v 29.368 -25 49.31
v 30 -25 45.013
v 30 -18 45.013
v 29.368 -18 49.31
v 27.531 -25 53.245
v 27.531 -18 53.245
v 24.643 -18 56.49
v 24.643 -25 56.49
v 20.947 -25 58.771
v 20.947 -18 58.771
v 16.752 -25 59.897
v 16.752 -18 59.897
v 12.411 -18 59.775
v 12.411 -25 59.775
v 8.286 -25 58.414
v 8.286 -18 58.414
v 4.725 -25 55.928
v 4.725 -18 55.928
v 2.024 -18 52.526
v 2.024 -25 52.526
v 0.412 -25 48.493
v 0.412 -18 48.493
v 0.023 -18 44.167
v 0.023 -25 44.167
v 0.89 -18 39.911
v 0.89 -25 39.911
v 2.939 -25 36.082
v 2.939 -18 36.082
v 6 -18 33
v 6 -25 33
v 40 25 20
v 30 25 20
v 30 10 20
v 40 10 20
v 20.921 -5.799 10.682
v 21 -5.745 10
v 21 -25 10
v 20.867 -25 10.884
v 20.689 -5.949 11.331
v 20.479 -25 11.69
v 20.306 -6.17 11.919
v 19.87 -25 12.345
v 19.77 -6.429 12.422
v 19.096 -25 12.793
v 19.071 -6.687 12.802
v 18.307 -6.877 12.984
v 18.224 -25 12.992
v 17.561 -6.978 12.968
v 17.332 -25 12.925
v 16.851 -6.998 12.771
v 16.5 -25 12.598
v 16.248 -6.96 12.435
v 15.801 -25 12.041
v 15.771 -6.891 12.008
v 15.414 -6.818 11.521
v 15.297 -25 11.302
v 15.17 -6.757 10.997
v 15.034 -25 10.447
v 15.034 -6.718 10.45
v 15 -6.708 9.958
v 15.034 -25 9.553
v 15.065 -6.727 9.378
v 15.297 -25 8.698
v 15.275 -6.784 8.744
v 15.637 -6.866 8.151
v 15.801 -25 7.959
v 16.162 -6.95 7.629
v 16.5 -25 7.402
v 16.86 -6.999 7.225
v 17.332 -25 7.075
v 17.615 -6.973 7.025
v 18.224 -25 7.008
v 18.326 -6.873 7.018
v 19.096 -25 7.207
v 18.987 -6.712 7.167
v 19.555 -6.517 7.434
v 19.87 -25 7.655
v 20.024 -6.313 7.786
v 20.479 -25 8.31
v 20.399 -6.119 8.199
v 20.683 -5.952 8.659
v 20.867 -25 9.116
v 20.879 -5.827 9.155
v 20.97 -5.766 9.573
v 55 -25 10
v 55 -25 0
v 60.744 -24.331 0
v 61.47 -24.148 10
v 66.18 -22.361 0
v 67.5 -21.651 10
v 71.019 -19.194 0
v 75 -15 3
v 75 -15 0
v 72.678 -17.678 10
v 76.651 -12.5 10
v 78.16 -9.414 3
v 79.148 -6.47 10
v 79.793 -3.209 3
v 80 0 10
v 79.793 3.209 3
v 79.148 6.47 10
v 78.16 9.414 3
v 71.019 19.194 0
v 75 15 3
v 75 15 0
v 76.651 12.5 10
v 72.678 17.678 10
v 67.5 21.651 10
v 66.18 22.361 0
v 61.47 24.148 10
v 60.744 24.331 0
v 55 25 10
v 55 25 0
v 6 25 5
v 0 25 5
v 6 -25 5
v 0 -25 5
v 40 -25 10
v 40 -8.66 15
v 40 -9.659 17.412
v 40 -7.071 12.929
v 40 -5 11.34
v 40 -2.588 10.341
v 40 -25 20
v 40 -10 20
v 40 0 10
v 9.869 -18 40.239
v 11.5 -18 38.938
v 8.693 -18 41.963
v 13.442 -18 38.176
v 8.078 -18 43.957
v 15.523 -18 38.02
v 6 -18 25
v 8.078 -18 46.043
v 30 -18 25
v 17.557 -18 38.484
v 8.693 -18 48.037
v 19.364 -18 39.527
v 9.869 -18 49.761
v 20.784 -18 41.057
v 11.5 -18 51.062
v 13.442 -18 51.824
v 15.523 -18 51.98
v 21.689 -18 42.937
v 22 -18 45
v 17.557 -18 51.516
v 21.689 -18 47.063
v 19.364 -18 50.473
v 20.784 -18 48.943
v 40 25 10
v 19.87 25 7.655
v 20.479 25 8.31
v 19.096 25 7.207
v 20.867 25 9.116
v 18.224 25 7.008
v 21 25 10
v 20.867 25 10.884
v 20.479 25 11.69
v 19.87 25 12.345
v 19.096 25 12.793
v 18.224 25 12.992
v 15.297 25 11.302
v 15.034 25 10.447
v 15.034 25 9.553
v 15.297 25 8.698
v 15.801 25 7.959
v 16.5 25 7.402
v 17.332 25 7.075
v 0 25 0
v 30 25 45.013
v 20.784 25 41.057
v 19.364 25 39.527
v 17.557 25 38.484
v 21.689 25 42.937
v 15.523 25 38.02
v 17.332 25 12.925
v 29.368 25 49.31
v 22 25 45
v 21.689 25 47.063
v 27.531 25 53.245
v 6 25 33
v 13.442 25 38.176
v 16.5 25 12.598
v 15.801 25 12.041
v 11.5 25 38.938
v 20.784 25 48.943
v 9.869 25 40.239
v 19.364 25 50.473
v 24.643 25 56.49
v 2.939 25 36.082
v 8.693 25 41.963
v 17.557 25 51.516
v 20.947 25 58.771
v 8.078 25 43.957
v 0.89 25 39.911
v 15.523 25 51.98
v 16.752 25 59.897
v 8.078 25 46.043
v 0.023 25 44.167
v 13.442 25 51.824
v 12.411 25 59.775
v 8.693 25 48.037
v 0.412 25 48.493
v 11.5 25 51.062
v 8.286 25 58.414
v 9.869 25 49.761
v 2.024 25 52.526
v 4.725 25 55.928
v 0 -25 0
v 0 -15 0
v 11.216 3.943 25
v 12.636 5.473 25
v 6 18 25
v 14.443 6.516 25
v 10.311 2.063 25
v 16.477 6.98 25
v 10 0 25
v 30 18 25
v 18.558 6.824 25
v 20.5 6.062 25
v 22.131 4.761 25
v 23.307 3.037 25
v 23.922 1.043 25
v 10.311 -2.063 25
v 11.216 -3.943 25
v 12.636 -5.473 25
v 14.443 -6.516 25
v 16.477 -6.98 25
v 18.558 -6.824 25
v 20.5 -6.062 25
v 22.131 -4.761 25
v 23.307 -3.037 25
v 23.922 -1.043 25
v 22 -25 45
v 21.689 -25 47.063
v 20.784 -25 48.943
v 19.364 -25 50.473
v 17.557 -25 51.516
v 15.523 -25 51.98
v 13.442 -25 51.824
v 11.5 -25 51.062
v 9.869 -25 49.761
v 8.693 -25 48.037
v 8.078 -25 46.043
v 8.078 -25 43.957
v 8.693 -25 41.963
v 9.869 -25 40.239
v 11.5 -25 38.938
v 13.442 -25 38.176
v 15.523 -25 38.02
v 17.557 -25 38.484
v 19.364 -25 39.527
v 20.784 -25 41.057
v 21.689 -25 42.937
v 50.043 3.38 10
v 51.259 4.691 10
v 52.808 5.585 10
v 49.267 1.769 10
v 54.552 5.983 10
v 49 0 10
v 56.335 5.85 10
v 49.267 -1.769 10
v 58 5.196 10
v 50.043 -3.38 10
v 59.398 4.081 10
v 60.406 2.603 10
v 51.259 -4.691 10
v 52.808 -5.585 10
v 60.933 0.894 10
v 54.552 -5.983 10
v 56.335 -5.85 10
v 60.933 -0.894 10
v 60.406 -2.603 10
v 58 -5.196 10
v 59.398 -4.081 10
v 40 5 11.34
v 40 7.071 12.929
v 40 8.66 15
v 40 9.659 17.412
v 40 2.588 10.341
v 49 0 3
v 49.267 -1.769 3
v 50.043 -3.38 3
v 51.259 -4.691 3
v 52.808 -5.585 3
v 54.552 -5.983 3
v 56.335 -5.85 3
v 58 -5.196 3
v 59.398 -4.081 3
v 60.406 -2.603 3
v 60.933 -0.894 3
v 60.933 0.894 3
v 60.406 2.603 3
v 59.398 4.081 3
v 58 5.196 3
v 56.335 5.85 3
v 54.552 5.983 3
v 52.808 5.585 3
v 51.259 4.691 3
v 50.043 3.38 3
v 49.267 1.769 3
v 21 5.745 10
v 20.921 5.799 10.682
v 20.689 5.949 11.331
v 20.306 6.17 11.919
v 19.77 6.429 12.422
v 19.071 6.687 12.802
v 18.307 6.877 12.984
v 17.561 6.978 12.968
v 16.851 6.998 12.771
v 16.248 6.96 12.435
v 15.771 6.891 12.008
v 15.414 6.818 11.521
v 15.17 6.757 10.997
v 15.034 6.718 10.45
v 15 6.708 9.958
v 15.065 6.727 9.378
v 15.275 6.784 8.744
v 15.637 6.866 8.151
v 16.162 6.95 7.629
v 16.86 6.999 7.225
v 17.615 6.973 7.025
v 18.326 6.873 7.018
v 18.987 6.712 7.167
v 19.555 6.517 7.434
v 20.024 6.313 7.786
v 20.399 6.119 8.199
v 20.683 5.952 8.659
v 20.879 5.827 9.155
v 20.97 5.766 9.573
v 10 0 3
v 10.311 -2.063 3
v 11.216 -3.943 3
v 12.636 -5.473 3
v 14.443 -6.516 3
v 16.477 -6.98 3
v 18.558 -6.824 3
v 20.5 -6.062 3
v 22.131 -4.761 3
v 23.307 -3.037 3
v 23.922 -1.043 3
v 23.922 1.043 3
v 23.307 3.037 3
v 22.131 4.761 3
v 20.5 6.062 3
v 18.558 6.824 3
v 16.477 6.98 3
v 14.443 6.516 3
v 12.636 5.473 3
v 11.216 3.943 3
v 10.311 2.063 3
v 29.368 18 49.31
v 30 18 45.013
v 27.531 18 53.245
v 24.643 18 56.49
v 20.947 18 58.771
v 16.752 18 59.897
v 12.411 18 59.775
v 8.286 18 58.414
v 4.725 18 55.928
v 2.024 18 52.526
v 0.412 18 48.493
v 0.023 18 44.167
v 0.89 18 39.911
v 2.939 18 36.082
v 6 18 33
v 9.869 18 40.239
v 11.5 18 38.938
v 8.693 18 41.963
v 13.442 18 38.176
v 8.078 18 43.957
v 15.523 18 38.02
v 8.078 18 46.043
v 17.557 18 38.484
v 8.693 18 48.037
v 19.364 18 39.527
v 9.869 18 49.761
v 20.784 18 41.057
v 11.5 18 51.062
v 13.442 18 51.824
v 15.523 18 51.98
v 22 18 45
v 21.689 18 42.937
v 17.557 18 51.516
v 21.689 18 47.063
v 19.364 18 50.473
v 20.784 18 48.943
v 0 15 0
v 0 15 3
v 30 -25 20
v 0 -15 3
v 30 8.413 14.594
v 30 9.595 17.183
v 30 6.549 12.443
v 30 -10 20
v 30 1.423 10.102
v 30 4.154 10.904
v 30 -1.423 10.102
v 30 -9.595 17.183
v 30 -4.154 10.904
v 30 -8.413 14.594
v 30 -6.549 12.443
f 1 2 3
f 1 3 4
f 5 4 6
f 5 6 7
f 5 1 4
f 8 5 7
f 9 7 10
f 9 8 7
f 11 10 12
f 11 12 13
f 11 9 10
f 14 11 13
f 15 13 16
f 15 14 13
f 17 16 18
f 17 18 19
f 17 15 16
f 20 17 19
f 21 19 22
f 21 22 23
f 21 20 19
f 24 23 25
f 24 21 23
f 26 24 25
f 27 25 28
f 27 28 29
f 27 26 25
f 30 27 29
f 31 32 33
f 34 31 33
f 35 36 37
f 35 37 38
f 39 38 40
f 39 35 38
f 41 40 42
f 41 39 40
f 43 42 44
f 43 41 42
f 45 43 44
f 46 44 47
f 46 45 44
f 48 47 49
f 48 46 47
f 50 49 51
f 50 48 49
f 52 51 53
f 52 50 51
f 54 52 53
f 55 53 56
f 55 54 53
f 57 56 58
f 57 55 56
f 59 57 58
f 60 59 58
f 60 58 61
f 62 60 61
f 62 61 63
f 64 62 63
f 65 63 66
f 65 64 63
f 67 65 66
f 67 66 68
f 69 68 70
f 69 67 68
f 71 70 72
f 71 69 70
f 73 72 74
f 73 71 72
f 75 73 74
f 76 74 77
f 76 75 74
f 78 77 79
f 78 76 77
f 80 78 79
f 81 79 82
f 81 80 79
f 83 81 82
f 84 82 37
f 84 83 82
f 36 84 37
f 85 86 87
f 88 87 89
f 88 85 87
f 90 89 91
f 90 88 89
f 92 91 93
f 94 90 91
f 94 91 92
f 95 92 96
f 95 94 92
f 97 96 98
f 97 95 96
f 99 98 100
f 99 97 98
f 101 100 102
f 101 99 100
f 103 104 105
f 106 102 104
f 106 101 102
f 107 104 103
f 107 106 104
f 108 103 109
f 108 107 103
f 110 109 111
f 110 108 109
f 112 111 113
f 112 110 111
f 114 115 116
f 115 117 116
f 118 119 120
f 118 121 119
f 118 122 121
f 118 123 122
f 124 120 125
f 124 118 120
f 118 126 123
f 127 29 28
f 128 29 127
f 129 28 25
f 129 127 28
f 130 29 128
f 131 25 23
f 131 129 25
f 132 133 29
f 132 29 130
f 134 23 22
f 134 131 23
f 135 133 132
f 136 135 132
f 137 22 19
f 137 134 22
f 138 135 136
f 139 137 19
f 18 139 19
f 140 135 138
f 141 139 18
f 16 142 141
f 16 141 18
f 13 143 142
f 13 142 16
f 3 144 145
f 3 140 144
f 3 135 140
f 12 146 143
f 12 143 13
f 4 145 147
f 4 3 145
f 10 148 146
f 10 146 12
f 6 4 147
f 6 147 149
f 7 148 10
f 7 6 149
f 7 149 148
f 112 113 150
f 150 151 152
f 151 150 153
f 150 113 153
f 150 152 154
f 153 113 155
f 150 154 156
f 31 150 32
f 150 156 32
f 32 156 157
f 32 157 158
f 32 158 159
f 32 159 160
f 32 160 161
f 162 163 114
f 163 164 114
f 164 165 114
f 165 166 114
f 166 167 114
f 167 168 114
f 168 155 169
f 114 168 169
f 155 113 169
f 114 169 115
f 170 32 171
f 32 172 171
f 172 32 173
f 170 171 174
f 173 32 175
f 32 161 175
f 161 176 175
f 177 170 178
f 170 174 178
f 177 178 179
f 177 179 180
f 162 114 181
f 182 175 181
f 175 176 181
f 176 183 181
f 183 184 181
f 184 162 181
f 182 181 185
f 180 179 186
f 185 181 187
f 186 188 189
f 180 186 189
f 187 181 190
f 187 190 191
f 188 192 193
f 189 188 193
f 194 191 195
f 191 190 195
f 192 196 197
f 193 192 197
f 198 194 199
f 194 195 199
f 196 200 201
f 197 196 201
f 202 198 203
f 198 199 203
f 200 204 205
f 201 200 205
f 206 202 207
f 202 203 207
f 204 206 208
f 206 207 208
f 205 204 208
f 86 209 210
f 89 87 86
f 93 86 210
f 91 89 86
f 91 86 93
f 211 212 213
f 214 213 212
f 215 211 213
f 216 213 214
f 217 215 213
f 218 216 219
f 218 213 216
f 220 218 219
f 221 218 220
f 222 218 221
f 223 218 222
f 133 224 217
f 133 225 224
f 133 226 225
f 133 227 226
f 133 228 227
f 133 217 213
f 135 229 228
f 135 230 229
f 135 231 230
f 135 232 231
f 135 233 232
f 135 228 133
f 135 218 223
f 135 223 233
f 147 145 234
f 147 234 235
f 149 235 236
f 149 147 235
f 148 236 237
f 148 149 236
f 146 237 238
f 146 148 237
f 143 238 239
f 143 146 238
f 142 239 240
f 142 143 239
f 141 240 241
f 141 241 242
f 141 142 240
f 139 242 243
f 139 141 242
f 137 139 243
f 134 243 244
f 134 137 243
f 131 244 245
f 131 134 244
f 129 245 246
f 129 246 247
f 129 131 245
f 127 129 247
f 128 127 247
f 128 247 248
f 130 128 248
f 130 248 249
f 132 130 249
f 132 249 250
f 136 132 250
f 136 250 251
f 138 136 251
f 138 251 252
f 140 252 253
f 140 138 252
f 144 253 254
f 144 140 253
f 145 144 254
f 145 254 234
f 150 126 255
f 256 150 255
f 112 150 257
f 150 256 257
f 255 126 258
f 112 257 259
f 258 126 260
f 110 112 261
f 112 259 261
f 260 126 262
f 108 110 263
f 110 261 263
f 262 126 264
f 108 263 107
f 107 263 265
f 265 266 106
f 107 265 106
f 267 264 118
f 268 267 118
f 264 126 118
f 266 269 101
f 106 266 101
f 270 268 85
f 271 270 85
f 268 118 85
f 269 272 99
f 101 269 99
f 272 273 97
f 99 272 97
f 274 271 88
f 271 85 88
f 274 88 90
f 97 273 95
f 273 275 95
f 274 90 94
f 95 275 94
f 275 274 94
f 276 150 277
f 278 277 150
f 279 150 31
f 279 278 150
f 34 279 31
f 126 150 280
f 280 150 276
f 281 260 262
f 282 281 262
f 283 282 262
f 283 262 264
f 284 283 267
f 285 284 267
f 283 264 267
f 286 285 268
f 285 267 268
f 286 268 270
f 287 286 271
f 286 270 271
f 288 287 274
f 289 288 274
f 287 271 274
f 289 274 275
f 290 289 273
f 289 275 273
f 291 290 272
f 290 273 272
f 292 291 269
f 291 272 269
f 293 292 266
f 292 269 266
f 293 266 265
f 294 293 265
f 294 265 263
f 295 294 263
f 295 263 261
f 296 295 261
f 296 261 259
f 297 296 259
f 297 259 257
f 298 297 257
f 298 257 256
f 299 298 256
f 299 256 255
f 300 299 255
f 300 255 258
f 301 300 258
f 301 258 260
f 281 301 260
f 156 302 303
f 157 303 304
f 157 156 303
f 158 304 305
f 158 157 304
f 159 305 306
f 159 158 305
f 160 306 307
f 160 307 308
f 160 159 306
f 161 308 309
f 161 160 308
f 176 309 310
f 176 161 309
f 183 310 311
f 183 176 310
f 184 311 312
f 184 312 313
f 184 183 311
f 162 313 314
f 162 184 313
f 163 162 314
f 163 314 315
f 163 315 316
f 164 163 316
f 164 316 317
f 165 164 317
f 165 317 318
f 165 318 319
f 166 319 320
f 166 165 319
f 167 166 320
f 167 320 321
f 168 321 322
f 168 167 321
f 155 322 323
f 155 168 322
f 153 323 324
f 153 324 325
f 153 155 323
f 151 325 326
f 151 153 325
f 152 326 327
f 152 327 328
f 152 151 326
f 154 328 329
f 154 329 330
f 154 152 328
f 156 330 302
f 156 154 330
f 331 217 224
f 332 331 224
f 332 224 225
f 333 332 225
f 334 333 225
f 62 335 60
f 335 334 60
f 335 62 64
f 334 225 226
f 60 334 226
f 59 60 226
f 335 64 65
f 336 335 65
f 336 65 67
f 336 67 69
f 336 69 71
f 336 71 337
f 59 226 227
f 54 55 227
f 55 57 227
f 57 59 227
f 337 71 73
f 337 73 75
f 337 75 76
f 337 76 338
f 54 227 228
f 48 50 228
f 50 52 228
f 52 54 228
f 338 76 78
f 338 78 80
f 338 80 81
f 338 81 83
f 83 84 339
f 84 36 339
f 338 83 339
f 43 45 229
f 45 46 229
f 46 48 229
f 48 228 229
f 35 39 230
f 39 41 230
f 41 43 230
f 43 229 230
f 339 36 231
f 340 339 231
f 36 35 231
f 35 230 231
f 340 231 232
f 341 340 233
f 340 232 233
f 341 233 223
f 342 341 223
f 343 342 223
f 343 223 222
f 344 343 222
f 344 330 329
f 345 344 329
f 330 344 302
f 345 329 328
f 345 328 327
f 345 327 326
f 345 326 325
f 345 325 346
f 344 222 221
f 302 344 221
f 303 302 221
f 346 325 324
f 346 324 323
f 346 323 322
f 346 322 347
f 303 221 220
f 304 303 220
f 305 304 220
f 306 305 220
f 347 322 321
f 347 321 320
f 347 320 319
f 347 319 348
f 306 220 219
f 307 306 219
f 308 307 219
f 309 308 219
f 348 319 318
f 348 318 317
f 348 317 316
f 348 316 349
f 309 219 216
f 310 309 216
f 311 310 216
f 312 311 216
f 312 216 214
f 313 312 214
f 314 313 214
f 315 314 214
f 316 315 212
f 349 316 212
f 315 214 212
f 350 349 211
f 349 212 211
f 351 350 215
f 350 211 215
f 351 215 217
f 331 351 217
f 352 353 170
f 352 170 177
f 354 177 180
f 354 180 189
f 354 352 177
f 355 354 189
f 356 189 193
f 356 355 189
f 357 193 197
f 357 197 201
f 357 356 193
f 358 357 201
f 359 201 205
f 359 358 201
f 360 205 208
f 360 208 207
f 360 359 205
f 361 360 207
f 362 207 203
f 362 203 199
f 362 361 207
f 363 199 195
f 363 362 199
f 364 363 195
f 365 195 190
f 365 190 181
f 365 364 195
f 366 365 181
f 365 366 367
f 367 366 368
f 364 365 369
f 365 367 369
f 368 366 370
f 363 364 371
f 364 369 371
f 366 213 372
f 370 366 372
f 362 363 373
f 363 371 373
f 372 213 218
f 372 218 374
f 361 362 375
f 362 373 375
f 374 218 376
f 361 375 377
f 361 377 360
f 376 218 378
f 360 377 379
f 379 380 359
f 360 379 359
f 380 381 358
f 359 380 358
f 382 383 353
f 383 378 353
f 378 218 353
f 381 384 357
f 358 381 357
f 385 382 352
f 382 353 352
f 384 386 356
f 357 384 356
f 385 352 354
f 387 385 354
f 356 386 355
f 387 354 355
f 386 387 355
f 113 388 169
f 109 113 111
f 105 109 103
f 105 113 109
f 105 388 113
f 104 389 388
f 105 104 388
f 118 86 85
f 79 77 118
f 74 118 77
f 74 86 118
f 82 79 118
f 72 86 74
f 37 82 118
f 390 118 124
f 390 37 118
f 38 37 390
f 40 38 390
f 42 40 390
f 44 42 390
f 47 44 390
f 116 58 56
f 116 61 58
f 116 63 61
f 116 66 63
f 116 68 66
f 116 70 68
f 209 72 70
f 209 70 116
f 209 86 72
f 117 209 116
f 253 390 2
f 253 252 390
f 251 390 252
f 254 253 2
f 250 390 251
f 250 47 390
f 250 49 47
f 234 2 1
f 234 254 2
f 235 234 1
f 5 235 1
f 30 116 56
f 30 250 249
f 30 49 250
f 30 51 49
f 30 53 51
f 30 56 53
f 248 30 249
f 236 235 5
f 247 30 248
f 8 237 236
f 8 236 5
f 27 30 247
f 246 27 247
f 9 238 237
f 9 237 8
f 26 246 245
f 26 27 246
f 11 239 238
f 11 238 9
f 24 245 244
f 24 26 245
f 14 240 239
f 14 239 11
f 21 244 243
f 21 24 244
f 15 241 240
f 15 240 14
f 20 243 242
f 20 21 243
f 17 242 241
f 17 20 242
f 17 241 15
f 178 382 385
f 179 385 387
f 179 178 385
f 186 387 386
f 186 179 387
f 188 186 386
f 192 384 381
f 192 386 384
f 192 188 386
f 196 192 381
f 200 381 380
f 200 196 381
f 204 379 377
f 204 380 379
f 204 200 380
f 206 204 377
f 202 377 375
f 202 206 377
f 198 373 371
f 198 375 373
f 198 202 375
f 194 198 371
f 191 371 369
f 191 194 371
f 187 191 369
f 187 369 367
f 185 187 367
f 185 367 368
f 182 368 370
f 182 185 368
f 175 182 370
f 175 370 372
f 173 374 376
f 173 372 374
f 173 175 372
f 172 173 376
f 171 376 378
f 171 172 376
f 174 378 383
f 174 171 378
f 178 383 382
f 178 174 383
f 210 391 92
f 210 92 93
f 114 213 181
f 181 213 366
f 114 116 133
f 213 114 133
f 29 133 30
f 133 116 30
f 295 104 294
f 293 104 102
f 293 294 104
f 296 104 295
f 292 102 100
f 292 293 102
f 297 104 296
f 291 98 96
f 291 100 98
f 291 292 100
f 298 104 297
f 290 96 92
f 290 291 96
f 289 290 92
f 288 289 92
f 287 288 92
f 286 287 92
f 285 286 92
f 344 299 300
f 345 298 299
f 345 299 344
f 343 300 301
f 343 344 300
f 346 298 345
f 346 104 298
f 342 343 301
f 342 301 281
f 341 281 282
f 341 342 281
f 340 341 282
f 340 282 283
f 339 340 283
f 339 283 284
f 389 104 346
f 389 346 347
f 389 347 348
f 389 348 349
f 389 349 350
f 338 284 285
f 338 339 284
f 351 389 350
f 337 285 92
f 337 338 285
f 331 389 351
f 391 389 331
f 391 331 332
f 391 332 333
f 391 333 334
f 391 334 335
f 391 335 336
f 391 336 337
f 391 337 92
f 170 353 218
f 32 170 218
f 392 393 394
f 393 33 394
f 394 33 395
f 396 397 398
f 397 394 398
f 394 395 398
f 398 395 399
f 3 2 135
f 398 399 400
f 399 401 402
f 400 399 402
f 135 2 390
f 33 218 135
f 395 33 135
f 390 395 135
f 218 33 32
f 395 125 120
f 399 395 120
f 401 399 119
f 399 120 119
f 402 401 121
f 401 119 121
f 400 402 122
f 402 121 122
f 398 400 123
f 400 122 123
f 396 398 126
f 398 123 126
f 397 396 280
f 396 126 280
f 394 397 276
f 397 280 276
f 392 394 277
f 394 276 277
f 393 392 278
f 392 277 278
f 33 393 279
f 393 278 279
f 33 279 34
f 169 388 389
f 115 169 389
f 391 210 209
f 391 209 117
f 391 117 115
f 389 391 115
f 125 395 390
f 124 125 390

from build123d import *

# Parameters (mm, degrees)
SKETCH_R        = 7
SKETCH_R_2      = 3
PAD_DEPTH       = 25
SKETCH001_R     = 25
PAD001_DEPTH    = 10
SKETCH002_W     = 35
SKETCH002_H     = 36
POCKET_DEPTH    = 30.001
SKETCH003_R     = 7
POCKET001_DEPTH = 25.001
SKETCH004_R     = 6
POCKET002_DEPTH = 10.001
SKETCH005_W     = 10
SKETCH005_H     = 50
PAD002_DEPTH    = 10
SKETCH006_R     = 10
POCKET003_DEPTH = 10
SKETCH007_W     = 3
SKETCH007_H     = 30
POCKET004_DEPTH = 80.001


with BuildPart() as part:
    # Sketch → Pad (new body, symmetric)
    with BuildSketch(Plane.XZ):
        with BuildLine():
            Line((0, 0), (0, 5))
            Line((0, 5), (6, 5))
            Line((6, 5), (6, 33.000004))
            ThreePointArc((30, 45.012649), (8.286148, 58.41358), (6, 33.000004))
            Line((30, 45.012649), (30, 10))
            Line((30, 10), (55, 10))
            Line((55, 10), (55, 0))
            Line((0, 0), (55, 0))
        make_face()
        with Locations((15.000005, 45)):
            Circle(SKETCH_R, mode=Mode.SUBTRACT)
        with Locations((18, 10)):
            Circle(SKETCH_R_2, mode=Mode.SUBTRACT)
    extrude(amount=PAD_DEPTH, both=True)

    # Sketch001 → Pad001 (new body)
    with BuildSketch(Plane(origin=(0, 0, 10), x_dir=(-1, 0, 0), z_dir=(0, 0, 1))):
        with Locations((-55, 0)):
            Circle(SKETCH001_R)
    extrude(amount=-PAD001_DEPTH)

    # Sketch002 → Pocket (cut, through all)
    with BuildSketch(Plane(origin=(30, 0, 0), x_dir=(0, 0, 1), z_dir=(1, 0, 0))):
        with Locations((42.5, 0)):
            Rectangle(SKETCH002_W, SKETCH002_H)
    extrude(amount=-POCKET_DEPTH, mode=Mode.SUBTRACT)

    # Sketch003 → Pocket001 (cut, through all)
    with BuildSketch(Plane(origin=(0, 0, 25), x_dir=(-1, 0, 0), z_dir=(0, 0, 1))):
        with Locations((-17, 0)):
            Circle(SKETCH003_R)
    extrude(amount=-POCKET001_DEPTH, mode=Mode.SUBTRACT)

    # Sketch004 → Pocket002 (cut, through all)
    with BuildSketch(Plane(origin=(0, 0, 10), x_dir=(-1, 0, 0), z_dir=(0, 0, 1))):
        with Locations((-55, 0)):
            Circle(SKETCH004_R)
    extrude(amount=-POCKET002_DEPTH, mode=Mode.SUBTRACT)

    # Sketch005 → Pad002 (new body)
    with BuildSketch(Plane(origin=(30, 0, 0), x_dir=(0, 0, 1), z_dir=(1, 0, 0))):
        with Locations((15, 0)):
            Rectangle(SKETCH005_W, SKETCH005_H)
    extrude(amount=PAD002_DEPTH)

    # Sketch006 → Pocket003 (cut)
    with BuildSketch(Plane(origin=(40, 0, 0), x_dir=(0, 0, 1), z_dir=(1, 0, 0))):
        with Locations((20, 0)):
            Circle(SKETCH006_R)
    extrude(amount=-POCKET003_DEPTH, mode=Mode.SUBTRACT)

    # Sketch007 → Pocket004 (cut, through all)
    with BuildSketch(Plane(origin=(0, 0, 0), x_dir=(0, 0, -1), z_dir=(-1, 0, 0))):
        with Locations((-1.5, 0)):
            Rectangle(SKETCH007_W, SKETCH007_H)
    extrude(amount=-POCKET004_DEPTH, mode=Mode.SUBTRACT)


solid = part.part
